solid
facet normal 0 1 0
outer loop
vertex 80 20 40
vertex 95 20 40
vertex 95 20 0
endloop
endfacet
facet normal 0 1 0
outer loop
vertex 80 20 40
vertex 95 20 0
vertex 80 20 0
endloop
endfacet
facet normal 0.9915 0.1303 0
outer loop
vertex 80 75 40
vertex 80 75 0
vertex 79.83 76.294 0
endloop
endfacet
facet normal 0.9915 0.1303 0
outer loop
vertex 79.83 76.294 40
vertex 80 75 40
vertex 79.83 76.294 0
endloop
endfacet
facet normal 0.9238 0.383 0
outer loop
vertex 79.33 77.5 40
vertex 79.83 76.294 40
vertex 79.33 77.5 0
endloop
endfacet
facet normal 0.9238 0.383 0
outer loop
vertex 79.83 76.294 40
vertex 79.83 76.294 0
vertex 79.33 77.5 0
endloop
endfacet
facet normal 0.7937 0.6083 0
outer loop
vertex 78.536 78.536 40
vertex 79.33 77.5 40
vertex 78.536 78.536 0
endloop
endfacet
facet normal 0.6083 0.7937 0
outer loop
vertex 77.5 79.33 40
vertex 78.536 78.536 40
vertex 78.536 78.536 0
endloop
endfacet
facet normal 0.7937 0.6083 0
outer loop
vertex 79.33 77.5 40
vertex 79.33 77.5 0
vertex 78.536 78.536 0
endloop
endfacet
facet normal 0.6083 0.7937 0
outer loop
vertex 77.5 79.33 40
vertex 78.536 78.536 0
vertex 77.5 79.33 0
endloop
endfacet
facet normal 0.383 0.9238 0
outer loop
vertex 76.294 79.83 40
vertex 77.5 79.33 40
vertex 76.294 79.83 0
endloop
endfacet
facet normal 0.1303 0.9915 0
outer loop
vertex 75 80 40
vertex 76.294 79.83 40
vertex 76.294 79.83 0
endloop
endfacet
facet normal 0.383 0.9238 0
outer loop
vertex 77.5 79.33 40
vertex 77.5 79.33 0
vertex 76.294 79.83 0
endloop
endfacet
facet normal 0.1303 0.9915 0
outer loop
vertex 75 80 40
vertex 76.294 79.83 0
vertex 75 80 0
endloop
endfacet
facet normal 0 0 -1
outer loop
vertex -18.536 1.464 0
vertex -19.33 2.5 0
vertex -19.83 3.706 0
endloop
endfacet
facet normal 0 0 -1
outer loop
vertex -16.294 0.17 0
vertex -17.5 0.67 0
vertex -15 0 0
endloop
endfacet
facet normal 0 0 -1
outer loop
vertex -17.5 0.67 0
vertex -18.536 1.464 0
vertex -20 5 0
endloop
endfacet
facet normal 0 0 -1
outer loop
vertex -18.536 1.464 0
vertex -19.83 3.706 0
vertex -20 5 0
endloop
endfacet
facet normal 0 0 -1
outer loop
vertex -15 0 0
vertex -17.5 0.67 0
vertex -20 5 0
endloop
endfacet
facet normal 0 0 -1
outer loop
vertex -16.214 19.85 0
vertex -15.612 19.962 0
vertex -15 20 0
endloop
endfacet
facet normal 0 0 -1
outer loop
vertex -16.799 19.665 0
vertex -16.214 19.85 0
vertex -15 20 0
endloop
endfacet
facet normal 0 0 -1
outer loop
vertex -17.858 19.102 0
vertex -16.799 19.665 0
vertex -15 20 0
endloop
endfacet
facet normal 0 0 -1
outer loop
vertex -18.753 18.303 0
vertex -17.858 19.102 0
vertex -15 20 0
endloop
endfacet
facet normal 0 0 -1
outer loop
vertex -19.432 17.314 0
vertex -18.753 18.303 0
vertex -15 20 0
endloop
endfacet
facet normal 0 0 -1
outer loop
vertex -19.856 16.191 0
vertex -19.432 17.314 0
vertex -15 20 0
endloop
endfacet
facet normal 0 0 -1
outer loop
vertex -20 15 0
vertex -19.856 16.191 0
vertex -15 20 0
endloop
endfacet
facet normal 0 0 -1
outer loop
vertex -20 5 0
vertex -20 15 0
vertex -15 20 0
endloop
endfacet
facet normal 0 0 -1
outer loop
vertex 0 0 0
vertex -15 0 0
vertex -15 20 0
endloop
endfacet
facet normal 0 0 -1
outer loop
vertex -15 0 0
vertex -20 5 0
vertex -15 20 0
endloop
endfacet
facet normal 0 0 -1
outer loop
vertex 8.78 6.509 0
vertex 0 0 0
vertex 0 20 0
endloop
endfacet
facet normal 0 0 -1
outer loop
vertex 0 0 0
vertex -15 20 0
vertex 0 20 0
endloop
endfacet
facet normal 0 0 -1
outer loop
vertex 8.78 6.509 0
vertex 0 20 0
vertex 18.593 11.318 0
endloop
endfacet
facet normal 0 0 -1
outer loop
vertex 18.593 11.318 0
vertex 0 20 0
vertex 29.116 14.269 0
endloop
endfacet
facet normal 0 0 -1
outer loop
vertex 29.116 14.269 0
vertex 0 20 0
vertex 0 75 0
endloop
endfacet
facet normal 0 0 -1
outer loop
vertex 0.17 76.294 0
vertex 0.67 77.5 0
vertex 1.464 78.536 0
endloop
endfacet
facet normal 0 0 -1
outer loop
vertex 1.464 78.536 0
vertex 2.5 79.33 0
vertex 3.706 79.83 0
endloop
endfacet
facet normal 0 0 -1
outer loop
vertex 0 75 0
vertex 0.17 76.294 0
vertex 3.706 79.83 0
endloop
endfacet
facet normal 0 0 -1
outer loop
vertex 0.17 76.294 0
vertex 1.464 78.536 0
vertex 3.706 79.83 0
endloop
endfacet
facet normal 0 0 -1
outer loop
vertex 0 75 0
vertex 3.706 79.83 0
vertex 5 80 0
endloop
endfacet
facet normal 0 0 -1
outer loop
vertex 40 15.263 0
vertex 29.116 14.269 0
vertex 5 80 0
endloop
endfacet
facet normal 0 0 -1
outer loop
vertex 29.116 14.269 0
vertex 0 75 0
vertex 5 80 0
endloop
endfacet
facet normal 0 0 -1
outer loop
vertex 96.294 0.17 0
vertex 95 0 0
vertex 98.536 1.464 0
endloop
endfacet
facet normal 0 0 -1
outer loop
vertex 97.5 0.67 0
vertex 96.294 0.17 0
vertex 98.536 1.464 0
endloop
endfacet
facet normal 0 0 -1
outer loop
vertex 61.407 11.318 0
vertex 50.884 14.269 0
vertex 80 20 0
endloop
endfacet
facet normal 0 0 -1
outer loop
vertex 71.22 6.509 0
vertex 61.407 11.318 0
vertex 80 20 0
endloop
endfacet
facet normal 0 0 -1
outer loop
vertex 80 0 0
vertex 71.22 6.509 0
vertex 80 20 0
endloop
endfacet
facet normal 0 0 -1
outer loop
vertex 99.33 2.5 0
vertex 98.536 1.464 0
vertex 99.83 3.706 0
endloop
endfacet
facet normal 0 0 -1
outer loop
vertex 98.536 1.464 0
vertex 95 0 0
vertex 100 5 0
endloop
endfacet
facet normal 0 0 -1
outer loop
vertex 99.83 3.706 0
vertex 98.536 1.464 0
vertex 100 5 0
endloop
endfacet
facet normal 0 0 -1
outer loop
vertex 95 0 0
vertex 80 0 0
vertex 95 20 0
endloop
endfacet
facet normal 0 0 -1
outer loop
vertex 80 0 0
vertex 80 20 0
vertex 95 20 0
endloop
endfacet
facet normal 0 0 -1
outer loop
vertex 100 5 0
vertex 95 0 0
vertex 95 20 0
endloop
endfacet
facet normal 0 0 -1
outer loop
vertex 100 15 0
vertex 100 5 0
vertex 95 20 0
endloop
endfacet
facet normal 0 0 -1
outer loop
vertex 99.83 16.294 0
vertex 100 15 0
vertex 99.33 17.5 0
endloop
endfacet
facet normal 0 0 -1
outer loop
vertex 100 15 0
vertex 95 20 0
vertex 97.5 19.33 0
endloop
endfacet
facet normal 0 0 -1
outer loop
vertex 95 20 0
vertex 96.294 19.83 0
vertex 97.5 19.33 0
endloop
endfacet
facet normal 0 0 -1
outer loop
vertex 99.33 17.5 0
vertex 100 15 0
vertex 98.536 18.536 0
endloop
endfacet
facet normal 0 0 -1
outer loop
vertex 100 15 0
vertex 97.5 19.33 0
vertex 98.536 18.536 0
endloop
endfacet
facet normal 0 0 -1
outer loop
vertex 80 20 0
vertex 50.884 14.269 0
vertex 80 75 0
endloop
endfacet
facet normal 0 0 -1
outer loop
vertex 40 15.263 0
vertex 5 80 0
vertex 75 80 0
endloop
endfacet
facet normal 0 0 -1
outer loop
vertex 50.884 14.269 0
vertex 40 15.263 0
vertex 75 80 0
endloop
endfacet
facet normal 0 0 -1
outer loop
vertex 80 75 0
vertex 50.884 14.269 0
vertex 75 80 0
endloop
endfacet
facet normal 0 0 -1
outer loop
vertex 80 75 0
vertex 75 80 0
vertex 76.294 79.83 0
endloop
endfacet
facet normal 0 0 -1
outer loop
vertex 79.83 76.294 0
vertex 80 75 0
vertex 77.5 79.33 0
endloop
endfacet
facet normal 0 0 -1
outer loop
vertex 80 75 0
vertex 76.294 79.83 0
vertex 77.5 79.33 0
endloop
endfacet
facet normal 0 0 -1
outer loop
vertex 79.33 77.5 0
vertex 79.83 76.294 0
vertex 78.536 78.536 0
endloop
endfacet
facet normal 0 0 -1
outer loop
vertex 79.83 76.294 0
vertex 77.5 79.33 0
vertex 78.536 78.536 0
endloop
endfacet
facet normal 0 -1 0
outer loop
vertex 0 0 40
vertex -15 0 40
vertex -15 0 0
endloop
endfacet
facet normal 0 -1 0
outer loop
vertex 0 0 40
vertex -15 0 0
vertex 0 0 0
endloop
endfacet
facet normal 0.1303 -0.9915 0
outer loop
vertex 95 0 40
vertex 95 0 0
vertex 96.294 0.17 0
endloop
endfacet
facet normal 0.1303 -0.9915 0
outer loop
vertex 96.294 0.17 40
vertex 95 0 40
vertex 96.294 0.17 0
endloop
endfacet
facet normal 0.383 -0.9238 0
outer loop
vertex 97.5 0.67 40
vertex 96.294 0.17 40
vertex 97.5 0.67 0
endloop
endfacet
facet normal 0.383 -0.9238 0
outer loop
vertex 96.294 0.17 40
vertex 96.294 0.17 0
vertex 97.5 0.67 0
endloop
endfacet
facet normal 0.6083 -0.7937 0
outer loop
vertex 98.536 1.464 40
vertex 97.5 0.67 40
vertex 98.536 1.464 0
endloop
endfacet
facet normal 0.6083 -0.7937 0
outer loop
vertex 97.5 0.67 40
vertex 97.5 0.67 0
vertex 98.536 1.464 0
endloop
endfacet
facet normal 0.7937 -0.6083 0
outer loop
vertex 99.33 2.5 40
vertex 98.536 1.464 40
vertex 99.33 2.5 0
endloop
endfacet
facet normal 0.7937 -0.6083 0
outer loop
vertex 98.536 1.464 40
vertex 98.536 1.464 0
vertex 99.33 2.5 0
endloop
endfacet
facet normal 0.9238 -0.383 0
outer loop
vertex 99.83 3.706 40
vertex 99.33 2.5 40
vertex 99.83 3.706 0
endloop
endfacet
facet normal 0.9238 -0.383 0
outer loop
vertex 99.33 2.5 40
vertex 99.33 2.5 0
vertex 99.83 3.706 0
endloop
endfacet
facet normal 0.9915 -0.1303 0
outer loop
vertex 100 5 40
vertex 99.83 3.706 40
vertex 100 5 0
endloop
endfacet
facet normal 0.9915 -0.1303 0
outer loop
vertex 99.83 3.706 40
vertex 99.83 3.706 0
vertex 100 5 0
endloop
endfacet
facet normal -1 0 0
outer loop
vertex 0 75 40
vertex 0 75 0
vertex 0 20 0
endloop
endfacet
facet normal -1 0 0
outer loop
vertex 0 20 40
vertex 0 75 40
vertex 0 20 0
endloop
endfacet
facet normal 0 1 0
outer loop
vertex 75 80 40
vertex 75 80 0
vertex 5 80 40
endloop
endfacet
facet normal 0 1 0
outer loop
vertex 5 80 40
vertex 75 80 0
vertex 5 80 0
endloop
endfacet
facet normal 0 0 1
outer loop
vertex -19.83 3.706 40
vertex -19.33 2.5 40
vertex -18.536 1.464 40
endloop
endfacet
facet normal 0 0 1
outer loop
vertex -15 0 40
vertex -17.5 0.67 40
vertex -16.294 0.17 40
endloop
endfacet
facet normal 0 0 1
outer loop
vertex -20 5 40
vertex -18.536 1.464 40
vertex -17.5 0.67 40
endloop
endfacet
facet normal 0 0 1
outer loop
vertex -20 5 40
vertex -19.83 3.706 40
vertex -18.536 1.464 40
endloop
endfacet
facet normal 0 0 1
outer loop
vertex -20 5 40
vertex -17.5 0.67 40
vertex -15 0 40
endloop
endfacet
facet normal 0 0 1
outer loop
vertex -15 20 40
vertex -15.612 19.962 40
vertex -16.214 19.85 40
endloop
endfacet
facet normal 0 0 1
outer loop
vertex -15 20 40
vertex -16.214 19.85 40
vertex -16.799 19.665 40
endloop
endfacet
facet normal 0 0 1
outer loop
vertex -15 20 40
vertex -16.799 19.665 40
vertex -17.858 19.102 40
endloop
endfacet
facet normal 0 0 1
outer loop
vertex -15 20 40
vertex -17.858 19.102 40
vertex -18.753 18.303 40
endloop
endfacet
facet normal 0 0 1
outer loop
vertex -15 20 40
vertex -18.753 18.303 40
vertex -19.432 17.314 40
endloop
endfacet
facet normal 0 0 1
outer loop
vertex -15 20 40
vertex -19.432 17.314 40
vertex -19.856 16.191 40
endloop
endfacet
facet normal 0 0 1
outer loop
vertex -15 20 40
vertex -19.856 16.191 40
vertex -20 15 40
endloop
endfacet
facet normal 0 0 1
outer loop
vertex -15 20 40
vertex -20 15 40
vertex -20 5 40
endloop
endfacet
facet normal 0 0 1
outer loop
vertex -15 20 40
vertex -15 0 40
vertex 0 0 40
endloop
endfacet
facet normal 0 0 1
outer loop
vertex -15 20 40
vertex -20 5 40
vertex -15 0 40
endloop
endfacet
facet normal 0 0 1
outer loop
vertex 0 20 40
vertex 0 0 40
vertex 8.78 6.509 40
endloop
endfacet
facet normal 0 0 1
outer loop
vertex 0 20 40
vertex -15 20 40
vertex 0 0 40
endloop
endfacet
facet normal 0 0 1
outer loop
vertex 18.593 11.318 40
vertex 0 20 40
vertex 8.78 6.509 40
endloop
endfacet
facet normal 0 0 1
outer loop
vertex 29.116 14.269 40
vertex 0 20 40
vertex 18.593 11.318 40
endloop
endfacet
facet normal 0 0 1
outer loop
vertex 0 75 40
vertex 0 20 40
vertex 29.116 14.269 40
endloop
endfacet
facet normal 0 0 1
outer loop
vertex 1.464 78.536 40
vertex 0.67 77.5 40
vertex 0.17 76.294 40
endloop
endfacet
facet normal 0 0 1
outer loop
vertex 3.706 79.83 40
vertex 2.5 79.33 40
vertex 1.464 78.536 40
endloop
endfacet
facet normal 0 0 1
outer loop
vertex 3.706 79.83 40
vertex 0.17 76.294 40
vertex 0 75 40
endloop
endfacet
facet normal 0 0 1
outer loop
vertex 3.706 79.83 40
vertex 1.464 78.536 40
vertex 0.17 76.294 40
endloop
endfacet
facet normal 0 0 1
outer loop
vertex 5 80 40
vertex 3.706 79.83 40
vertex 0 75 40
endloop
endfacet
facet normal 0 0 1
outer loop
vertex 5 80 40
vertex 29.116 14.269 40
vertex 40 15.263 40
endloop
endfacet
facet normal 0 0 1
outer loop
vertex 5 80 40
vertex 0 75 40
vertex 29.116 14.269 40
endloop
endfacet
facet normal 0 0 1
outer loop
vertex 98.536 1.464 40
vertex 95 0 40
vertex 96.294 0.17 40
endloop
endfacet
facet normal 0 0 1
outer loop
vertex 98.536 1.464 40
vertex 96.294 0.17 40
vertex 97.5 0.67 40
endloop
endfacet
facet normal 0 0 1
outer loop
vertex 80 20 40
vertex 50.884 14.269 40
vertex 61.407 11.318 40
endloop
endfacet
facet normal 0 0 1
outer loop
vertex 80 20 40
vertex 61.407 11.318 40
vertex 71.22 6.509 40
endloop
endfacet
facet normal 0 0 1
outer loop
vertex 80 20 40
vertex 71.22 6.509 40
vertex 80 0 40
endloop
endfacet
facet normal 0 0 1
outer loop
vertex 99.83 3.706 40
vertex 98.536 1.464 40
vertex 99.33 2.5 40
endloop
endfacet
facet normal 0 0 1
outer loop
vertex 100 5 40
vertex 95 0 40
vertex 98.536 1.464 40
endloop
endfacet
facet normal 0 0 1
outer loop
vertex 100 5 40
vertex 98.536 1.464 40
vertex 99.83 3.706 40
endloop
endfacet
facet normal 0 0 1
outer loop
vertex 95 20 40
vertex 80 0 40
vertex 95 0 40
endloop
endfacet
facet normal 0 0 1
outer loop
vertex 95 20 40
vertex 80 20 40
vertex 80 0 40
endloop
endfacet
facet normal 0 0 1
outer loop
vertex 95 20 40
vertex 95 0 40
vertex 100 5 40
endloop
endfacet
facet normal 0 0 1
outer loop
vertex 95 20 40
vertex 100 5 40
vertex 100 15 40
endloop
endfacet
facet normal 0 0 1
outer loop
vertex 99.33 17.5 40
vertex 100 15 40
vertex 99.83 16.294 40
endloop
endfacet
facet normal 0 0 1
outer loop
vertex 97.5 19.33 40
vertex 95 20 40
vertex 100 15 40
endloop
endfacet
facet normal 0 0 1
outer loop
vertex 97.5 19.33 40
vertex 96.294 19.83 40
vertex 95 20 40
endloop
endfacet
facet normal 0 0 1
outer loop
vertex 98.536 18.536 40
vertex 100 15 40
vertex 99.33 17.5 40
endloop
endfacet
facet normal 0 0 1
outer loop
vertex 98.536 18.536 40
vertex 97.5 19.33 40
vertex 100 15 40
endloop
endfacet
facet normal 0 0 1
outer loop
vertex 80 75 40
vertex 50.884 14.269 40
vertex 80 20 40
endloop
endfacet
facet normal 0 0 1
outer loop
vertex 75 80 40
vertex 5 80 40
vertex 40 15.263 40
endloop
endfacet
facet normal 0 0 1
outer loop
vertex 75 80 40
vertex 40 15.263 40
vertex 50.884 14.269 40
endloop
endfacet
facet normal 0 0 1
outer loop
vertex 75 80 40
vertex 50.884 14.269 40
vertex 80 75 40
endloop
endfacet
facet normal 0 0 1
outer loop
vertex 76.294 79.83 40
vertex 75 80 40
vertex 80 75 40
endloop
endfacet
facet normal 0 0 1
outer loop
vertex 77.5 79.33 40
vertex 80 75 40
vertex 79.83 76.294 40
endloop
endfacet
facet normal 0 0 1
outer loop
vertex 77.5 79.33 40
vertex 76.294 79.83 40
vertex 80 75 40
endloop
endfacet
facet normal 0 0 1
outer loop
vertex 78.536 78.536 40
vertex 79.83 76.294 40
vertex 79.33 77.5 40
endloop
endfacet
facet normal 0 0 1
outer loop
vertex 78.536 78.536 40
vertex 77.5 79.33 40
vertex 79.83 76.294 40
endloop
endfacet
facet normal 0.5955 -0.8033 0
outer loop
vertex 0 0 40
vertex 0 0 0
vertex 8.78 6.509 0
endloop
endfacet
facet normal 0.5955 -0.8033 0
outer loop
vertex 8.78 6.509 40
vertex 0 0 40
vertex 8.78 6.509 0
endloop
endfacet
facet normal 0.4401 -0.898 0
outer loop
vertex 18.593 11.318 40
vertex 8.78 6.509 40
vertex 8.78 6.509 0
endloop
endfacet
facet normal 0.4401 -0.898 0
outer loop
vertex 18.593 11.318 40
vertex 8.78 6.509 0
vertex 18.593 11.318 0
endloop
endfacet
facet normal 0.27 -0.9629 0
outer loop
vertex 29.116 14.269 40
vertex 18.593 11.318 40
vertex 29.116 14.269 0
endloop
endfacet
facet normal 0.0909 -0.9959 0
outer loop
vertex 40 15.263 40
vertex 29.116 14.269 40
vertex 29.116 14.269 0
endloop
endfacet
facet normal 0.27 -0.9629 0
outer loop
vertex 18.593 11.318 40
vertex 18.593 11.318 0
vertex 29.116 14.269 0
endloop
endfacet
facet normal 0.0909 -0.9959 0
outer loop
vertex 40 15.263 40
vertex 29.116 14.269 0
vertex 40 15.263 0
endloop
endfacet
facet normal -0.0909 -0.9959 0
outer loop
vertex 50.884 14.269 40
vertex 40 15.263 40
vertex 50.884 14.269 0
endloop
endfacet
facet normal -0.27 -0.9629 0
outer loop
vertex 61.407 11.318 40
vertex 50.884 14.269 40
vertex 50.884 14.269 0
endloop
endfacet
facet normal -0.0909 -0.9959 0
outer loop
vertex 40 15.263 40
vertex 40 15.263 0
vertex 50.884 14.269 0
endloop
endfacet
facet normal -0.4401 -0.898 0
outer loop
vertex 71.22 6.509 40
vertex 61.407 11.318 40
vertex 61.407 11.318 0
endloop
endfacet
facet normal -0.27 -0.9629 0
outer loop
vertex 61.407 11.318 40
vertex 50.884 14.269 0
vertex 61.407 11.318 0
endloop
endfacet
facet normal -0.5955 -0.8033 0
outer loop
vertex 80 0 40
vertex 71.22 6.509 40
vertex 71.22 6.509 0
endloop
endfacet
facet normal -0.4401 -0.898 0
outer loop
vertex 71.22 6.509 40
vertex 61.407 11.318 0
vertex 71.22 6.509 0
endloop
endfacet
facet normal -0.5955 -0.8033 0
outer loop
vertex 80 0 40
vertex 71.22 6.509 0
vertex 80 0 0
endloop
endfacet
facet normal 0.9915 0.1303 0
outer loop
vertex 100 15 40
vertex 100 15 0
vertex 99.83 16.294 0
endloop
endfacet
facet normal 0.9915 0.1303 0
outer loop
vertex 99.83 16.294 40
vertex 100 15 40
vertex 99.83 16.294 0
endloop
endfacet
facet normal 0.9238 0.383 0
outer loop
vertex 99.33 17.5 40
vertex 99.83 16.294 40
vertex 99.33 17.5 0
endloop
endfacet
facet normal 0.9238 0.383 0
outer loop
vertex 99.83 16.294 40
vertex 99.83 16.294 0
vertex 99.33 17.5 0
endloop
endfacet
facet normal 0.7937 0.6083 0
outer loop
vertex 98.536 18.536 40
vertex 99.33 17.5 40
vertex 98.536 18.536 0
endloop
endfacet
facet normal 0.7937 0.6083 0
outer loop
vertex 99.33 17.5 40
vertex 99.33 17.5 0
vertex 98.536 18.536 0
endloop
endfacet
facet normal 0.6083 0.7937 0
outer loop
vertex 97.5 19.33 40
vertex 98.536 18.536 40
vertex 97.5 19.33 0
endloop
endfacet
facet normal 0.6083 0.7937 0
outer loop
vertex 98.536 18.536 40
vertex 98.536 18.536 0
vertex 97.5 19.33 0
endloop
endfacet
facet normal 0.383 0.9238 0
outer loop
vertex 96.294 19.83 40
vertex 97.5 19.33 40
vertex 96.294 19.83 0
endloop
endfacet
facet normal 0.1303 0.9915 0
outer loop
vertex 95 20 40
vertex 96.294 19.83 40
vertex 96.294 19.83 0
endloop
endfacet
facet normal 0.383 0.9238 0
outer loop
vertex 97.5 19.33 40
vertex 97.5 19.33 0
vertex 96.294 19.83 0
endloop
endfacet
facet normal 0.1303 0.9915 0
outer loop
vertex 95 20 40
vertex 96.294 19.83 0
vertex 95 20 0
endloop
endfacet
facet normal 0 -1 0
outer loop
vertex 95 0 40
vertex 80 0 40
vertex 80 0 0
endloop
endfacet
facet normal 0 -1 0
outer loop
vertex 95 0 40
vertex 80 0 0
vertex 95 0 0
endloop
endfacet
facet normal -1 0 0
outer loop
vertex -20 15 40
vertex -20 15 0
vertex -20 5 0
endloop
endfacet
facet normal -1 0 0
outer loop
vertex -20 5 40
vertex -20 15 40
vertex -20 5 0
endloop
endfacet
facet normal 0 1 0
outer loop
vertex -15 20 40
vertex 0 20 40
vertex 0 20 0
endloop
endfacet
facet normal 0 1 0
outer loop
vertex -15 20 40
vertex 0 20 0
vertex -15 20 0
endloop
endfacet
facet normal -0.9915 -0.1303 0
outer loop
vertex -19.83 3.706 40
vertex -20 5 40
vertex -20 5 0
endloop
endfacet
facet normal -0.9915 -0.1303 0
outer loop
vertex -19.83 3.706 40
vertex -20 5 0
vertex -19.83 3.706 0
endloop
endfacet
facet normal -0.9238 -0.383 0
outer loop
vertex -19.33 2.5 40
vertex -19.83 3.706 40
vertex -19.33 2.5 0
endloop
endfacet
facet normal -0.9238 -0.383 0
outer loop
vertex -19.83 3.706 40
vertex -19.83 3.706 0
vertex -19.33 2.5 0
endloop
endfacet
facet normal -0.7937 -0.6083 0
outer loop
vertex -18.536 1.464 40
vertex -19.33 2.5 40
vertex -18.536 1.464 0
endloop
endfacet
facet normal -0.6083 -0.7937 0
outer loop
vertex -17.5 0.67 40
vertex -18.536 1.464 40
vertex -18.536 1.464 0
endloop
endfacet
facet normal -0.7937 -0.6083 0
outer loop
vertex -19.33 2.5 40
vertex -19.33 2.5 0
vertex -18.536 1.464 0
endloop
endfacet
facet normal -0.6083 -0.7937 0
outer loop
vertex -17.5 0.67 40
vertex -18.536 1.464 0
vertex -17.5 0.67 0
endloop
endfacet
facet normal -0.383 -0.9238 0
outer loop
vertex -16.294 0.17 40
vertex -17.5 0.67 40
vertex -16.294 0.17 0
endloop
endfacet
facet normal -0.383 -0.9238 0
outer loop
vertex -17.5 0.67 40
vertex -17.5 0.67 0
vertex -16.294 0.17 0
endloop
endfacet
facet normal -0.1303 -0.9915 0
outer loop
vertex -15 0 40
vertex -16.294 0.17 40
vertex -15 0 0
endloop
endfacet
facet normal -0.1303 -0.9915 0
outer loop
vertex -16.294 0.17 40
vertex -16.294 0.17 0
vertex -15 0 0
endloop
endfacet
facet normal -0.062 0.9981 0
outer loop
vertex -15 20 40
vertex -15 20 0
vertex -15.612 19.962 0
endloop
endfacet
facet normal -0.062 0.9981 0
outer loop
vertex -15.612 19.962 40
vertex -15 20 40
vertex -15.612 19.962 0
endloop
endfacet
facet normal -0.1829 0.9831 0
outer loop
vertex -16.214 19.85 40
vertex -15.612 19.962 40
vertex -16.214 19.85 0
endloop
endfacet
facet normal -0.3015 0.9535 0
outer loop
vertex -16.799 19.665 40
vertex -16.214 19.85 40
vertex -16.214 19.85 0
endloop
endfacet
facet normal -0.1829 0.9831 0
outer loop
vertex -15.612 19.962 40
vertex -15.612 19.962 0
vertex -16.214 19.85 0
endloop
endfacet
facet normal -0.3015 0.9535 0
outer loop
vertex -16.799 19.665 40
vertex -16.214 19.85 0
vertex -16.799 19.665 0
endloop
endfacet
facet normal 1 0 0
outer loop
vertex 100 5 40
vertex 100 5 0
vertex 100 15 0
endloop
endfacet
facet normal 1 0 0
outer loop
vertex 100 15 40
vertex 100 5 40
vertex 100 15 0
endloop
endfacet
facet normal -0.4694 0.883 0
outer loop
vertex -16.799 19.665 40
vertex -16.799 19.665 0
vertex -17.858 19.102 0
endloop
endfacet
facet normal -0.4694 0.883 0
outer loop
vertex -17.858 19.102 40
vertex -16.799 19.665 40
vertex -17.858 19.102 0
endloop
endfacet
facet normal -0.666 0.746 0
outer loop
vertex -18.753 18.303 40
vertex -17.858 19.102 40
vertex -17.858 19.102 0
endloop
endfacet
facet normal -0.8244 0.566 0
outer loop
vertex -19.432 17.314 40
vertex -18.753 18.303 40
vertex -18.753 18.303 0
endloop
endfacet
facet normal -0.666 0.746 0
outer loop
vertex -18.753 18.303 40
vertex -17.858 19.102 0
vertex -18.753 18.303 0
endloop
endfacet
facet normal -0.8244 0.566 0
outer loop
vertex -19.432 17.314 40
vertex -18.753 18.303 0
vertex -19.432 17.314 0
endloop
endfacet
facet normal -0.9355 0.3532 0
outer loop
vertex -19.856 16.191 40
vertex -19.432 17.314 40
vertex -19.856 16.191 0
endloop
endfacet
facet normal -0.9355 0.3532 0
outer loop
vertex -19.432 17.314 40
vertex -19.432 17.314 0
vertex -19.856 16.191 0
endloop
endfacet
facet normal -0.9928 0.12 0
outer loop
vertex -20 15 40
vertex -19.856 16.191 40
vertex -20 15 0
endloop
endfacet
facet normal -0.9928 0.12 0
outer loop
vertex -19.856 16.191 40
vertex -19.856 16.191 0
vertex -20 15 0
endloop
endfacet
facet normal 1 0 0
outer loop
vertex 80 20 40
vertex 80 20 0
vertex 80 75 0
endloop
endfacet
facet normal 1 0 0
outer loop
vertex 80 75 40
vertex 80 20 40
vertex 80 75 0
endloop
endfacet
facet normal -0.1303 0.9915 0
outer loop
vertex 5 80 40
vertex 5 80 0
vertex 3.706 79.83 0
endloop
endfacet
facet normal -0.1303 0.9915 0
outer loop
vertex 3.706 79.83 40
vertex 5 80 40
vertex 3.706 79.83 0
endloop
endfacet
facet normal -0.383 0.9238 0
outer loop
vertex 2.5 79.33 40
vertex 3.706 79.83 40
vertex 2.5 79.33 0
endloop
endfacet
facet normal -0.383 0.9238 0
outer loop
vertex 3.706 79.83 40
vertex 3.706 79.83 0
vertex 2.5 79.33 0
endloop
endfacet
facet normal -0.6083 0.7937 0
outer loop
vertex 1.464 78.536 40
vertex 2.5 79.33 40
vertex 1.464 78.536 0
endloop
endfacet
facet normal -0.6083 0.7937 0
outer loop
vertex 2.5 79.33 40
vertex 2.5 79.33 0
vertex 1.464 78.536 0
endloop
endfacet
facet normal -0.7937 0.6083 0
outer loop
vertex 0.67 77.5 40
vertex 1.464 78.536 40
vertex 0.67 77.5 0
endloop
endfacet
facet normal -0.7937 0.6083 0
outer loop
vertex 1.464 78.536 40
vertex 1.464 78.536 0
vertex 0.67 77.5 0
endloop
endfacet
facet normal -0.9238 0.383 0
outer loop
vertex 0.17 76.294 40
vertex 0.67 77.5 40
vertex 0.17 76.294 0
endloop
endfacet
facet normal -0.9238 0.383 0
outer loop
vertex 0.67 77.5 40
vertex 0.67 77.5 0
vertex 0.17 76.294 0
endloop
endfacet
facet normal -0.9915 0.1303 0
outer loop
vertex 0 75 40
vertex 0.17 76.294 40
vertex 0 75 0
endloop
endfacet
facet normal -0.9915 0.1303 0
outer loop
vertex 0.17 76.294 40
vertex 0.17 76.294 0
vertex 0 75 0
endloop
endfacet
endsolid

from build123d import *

# Parameters (mm, degrees)
F1_DEPTH = 40


with BuildPart() as f1:
    # F0 (on Top) → F1 (new body)
    with BuildSketch(Plane.XY):
        with BuildLine():
            Line((75, 80), (5, 80))
            ThreePointArc((5, 80), (1.464466, 78.535534), (0, 75))
            Line((0, 75), (0, 20))
            Line((0, 20), (-15, 20))
            ThreePointArc((-15, 20), (-15.914796, 19.915603), (-16.798709, 19.66526))
            ThreePointArc((-16.798709, 19.66526), (-19.122714, 17.828998), (-20, 15))
            Line((-20, 15), (-20, 5))
            ThreePointArc((-20, 5), (-18.535534, 1.464466), (-15, 0))
            Line((-15, 0), (0, 0))
            ThreePointArc((0, 0), (40, 15.263289), (80, 0))
            Line((80, 0), (95, 0))
            ThreePointArc((95, 0), (98.535534, 1.464466), (100, 5))
            Line((100, 5), (100, 15))
            ThreePointArc((100, 15), (98.535534, 18.535534), (95, 20))
            Line((95, 20), (80, 20))
            Line((80, 20), (80, 75))
            ThreePointArc((80, 75), (78.535534, 78.535534), (75, 80))
        make_face()
    extrude(amount=F1_DEPTH)


solid = f1.part
